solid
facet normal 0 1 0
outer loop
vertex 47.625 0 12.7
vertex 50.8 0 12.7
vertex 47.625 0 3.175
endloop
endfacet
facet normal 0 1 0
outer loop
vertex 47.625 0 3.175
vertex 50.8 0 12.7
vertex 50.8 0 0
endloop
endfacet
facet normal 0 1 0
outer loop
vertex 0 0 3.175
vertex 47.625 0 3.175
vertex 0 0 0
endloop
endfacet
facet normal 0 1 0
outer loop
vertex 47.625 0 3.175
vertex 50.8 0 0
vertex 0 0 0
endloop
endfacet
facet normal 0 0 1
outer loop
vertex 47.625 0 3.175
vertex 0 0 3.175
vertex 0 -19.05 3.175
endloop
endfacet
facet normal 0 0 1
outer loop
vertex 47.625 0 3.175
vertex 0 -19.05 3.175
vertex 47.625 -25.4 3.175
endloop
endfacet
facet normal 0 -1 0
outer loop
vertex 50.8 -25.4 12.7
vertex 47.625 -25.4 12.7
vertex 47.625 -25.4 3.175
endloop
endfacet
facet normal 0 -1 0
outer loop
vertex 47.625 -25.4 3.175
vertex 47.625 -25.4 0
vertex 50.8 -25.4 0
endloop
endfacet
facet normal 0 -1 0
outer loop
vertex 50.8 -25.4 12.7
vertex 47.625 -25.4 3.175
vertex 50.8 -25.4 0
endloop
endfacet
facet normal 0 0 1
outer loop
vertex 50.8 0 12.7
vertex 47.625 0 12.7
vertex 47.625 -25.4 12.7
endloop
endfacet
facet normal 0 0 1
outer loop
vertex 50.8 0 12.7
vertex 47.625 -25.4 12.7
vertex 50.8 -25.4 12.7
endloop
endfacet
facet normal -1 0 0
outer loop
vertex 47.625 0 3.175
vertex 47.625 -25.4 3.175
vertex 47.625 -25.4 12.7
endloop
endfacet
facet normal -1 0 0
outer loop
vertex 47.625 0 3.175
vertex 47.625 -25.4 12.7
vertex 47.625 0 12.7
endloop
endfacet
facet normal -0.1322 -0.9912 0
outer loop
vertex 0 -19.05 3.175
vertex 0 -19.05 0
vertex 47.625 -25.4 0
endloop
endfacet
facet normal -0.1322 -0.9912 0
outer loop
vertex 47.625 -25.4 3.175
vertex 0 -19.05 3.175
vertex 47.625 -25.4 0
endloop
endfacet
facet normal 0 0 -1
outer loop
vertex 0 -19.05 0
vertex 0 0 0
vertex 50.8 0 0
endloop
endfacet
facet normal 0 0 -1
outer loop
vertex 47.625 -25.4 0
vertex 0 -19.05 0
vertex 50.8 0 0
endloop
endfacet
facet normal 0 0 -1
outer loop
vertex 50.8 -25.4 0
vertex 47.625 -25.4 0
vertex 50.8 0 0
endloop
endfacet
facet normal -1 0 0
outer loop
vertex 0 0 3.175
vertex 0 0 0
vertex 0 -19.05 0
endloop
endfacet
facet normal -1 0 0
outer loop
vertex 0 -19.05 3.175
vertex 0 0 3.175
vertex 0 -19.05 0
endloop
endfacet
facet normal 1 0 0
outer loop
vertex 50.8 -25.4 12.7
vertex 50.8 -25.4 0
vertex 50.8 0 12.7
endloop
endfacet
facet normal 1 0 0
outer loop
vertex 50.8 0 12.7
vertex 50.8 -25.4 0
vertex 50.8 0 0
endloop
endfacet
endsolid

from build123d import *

# Parameters (mm, degrees)
BOSS_EXTRUDE1_DEPTH = 3.175
SKETCH2_3_W         = 3.175
SKETCH2_3_H         = 25.4
BOSS_EXTRUDE2_DEPTH = 12.7


with BuildPart() as part:
    # Sketch2 → Boss-Extrude1 (new body)
    with BuildSketch(Plane.XY):
        Polygon((0, 0), (0, -19.05), (47.625, -25.4), (50.8, -25.4), (50.8, 0), align=None)
    extrude(amount=BOSS_EXTRUDE1_DEPTH)

    # Sketch2<3> → Boss-Extrude2 (add)
    with BuildSketch(Plane.XY):
        with Locations((49.2125, -12.7)):
            Rectangle(SKETCH2_3_W, SKETCH2_3_H)
    extrude(amount=BOSS_EXTRUDE2_DEPTH)


solid = part.part
